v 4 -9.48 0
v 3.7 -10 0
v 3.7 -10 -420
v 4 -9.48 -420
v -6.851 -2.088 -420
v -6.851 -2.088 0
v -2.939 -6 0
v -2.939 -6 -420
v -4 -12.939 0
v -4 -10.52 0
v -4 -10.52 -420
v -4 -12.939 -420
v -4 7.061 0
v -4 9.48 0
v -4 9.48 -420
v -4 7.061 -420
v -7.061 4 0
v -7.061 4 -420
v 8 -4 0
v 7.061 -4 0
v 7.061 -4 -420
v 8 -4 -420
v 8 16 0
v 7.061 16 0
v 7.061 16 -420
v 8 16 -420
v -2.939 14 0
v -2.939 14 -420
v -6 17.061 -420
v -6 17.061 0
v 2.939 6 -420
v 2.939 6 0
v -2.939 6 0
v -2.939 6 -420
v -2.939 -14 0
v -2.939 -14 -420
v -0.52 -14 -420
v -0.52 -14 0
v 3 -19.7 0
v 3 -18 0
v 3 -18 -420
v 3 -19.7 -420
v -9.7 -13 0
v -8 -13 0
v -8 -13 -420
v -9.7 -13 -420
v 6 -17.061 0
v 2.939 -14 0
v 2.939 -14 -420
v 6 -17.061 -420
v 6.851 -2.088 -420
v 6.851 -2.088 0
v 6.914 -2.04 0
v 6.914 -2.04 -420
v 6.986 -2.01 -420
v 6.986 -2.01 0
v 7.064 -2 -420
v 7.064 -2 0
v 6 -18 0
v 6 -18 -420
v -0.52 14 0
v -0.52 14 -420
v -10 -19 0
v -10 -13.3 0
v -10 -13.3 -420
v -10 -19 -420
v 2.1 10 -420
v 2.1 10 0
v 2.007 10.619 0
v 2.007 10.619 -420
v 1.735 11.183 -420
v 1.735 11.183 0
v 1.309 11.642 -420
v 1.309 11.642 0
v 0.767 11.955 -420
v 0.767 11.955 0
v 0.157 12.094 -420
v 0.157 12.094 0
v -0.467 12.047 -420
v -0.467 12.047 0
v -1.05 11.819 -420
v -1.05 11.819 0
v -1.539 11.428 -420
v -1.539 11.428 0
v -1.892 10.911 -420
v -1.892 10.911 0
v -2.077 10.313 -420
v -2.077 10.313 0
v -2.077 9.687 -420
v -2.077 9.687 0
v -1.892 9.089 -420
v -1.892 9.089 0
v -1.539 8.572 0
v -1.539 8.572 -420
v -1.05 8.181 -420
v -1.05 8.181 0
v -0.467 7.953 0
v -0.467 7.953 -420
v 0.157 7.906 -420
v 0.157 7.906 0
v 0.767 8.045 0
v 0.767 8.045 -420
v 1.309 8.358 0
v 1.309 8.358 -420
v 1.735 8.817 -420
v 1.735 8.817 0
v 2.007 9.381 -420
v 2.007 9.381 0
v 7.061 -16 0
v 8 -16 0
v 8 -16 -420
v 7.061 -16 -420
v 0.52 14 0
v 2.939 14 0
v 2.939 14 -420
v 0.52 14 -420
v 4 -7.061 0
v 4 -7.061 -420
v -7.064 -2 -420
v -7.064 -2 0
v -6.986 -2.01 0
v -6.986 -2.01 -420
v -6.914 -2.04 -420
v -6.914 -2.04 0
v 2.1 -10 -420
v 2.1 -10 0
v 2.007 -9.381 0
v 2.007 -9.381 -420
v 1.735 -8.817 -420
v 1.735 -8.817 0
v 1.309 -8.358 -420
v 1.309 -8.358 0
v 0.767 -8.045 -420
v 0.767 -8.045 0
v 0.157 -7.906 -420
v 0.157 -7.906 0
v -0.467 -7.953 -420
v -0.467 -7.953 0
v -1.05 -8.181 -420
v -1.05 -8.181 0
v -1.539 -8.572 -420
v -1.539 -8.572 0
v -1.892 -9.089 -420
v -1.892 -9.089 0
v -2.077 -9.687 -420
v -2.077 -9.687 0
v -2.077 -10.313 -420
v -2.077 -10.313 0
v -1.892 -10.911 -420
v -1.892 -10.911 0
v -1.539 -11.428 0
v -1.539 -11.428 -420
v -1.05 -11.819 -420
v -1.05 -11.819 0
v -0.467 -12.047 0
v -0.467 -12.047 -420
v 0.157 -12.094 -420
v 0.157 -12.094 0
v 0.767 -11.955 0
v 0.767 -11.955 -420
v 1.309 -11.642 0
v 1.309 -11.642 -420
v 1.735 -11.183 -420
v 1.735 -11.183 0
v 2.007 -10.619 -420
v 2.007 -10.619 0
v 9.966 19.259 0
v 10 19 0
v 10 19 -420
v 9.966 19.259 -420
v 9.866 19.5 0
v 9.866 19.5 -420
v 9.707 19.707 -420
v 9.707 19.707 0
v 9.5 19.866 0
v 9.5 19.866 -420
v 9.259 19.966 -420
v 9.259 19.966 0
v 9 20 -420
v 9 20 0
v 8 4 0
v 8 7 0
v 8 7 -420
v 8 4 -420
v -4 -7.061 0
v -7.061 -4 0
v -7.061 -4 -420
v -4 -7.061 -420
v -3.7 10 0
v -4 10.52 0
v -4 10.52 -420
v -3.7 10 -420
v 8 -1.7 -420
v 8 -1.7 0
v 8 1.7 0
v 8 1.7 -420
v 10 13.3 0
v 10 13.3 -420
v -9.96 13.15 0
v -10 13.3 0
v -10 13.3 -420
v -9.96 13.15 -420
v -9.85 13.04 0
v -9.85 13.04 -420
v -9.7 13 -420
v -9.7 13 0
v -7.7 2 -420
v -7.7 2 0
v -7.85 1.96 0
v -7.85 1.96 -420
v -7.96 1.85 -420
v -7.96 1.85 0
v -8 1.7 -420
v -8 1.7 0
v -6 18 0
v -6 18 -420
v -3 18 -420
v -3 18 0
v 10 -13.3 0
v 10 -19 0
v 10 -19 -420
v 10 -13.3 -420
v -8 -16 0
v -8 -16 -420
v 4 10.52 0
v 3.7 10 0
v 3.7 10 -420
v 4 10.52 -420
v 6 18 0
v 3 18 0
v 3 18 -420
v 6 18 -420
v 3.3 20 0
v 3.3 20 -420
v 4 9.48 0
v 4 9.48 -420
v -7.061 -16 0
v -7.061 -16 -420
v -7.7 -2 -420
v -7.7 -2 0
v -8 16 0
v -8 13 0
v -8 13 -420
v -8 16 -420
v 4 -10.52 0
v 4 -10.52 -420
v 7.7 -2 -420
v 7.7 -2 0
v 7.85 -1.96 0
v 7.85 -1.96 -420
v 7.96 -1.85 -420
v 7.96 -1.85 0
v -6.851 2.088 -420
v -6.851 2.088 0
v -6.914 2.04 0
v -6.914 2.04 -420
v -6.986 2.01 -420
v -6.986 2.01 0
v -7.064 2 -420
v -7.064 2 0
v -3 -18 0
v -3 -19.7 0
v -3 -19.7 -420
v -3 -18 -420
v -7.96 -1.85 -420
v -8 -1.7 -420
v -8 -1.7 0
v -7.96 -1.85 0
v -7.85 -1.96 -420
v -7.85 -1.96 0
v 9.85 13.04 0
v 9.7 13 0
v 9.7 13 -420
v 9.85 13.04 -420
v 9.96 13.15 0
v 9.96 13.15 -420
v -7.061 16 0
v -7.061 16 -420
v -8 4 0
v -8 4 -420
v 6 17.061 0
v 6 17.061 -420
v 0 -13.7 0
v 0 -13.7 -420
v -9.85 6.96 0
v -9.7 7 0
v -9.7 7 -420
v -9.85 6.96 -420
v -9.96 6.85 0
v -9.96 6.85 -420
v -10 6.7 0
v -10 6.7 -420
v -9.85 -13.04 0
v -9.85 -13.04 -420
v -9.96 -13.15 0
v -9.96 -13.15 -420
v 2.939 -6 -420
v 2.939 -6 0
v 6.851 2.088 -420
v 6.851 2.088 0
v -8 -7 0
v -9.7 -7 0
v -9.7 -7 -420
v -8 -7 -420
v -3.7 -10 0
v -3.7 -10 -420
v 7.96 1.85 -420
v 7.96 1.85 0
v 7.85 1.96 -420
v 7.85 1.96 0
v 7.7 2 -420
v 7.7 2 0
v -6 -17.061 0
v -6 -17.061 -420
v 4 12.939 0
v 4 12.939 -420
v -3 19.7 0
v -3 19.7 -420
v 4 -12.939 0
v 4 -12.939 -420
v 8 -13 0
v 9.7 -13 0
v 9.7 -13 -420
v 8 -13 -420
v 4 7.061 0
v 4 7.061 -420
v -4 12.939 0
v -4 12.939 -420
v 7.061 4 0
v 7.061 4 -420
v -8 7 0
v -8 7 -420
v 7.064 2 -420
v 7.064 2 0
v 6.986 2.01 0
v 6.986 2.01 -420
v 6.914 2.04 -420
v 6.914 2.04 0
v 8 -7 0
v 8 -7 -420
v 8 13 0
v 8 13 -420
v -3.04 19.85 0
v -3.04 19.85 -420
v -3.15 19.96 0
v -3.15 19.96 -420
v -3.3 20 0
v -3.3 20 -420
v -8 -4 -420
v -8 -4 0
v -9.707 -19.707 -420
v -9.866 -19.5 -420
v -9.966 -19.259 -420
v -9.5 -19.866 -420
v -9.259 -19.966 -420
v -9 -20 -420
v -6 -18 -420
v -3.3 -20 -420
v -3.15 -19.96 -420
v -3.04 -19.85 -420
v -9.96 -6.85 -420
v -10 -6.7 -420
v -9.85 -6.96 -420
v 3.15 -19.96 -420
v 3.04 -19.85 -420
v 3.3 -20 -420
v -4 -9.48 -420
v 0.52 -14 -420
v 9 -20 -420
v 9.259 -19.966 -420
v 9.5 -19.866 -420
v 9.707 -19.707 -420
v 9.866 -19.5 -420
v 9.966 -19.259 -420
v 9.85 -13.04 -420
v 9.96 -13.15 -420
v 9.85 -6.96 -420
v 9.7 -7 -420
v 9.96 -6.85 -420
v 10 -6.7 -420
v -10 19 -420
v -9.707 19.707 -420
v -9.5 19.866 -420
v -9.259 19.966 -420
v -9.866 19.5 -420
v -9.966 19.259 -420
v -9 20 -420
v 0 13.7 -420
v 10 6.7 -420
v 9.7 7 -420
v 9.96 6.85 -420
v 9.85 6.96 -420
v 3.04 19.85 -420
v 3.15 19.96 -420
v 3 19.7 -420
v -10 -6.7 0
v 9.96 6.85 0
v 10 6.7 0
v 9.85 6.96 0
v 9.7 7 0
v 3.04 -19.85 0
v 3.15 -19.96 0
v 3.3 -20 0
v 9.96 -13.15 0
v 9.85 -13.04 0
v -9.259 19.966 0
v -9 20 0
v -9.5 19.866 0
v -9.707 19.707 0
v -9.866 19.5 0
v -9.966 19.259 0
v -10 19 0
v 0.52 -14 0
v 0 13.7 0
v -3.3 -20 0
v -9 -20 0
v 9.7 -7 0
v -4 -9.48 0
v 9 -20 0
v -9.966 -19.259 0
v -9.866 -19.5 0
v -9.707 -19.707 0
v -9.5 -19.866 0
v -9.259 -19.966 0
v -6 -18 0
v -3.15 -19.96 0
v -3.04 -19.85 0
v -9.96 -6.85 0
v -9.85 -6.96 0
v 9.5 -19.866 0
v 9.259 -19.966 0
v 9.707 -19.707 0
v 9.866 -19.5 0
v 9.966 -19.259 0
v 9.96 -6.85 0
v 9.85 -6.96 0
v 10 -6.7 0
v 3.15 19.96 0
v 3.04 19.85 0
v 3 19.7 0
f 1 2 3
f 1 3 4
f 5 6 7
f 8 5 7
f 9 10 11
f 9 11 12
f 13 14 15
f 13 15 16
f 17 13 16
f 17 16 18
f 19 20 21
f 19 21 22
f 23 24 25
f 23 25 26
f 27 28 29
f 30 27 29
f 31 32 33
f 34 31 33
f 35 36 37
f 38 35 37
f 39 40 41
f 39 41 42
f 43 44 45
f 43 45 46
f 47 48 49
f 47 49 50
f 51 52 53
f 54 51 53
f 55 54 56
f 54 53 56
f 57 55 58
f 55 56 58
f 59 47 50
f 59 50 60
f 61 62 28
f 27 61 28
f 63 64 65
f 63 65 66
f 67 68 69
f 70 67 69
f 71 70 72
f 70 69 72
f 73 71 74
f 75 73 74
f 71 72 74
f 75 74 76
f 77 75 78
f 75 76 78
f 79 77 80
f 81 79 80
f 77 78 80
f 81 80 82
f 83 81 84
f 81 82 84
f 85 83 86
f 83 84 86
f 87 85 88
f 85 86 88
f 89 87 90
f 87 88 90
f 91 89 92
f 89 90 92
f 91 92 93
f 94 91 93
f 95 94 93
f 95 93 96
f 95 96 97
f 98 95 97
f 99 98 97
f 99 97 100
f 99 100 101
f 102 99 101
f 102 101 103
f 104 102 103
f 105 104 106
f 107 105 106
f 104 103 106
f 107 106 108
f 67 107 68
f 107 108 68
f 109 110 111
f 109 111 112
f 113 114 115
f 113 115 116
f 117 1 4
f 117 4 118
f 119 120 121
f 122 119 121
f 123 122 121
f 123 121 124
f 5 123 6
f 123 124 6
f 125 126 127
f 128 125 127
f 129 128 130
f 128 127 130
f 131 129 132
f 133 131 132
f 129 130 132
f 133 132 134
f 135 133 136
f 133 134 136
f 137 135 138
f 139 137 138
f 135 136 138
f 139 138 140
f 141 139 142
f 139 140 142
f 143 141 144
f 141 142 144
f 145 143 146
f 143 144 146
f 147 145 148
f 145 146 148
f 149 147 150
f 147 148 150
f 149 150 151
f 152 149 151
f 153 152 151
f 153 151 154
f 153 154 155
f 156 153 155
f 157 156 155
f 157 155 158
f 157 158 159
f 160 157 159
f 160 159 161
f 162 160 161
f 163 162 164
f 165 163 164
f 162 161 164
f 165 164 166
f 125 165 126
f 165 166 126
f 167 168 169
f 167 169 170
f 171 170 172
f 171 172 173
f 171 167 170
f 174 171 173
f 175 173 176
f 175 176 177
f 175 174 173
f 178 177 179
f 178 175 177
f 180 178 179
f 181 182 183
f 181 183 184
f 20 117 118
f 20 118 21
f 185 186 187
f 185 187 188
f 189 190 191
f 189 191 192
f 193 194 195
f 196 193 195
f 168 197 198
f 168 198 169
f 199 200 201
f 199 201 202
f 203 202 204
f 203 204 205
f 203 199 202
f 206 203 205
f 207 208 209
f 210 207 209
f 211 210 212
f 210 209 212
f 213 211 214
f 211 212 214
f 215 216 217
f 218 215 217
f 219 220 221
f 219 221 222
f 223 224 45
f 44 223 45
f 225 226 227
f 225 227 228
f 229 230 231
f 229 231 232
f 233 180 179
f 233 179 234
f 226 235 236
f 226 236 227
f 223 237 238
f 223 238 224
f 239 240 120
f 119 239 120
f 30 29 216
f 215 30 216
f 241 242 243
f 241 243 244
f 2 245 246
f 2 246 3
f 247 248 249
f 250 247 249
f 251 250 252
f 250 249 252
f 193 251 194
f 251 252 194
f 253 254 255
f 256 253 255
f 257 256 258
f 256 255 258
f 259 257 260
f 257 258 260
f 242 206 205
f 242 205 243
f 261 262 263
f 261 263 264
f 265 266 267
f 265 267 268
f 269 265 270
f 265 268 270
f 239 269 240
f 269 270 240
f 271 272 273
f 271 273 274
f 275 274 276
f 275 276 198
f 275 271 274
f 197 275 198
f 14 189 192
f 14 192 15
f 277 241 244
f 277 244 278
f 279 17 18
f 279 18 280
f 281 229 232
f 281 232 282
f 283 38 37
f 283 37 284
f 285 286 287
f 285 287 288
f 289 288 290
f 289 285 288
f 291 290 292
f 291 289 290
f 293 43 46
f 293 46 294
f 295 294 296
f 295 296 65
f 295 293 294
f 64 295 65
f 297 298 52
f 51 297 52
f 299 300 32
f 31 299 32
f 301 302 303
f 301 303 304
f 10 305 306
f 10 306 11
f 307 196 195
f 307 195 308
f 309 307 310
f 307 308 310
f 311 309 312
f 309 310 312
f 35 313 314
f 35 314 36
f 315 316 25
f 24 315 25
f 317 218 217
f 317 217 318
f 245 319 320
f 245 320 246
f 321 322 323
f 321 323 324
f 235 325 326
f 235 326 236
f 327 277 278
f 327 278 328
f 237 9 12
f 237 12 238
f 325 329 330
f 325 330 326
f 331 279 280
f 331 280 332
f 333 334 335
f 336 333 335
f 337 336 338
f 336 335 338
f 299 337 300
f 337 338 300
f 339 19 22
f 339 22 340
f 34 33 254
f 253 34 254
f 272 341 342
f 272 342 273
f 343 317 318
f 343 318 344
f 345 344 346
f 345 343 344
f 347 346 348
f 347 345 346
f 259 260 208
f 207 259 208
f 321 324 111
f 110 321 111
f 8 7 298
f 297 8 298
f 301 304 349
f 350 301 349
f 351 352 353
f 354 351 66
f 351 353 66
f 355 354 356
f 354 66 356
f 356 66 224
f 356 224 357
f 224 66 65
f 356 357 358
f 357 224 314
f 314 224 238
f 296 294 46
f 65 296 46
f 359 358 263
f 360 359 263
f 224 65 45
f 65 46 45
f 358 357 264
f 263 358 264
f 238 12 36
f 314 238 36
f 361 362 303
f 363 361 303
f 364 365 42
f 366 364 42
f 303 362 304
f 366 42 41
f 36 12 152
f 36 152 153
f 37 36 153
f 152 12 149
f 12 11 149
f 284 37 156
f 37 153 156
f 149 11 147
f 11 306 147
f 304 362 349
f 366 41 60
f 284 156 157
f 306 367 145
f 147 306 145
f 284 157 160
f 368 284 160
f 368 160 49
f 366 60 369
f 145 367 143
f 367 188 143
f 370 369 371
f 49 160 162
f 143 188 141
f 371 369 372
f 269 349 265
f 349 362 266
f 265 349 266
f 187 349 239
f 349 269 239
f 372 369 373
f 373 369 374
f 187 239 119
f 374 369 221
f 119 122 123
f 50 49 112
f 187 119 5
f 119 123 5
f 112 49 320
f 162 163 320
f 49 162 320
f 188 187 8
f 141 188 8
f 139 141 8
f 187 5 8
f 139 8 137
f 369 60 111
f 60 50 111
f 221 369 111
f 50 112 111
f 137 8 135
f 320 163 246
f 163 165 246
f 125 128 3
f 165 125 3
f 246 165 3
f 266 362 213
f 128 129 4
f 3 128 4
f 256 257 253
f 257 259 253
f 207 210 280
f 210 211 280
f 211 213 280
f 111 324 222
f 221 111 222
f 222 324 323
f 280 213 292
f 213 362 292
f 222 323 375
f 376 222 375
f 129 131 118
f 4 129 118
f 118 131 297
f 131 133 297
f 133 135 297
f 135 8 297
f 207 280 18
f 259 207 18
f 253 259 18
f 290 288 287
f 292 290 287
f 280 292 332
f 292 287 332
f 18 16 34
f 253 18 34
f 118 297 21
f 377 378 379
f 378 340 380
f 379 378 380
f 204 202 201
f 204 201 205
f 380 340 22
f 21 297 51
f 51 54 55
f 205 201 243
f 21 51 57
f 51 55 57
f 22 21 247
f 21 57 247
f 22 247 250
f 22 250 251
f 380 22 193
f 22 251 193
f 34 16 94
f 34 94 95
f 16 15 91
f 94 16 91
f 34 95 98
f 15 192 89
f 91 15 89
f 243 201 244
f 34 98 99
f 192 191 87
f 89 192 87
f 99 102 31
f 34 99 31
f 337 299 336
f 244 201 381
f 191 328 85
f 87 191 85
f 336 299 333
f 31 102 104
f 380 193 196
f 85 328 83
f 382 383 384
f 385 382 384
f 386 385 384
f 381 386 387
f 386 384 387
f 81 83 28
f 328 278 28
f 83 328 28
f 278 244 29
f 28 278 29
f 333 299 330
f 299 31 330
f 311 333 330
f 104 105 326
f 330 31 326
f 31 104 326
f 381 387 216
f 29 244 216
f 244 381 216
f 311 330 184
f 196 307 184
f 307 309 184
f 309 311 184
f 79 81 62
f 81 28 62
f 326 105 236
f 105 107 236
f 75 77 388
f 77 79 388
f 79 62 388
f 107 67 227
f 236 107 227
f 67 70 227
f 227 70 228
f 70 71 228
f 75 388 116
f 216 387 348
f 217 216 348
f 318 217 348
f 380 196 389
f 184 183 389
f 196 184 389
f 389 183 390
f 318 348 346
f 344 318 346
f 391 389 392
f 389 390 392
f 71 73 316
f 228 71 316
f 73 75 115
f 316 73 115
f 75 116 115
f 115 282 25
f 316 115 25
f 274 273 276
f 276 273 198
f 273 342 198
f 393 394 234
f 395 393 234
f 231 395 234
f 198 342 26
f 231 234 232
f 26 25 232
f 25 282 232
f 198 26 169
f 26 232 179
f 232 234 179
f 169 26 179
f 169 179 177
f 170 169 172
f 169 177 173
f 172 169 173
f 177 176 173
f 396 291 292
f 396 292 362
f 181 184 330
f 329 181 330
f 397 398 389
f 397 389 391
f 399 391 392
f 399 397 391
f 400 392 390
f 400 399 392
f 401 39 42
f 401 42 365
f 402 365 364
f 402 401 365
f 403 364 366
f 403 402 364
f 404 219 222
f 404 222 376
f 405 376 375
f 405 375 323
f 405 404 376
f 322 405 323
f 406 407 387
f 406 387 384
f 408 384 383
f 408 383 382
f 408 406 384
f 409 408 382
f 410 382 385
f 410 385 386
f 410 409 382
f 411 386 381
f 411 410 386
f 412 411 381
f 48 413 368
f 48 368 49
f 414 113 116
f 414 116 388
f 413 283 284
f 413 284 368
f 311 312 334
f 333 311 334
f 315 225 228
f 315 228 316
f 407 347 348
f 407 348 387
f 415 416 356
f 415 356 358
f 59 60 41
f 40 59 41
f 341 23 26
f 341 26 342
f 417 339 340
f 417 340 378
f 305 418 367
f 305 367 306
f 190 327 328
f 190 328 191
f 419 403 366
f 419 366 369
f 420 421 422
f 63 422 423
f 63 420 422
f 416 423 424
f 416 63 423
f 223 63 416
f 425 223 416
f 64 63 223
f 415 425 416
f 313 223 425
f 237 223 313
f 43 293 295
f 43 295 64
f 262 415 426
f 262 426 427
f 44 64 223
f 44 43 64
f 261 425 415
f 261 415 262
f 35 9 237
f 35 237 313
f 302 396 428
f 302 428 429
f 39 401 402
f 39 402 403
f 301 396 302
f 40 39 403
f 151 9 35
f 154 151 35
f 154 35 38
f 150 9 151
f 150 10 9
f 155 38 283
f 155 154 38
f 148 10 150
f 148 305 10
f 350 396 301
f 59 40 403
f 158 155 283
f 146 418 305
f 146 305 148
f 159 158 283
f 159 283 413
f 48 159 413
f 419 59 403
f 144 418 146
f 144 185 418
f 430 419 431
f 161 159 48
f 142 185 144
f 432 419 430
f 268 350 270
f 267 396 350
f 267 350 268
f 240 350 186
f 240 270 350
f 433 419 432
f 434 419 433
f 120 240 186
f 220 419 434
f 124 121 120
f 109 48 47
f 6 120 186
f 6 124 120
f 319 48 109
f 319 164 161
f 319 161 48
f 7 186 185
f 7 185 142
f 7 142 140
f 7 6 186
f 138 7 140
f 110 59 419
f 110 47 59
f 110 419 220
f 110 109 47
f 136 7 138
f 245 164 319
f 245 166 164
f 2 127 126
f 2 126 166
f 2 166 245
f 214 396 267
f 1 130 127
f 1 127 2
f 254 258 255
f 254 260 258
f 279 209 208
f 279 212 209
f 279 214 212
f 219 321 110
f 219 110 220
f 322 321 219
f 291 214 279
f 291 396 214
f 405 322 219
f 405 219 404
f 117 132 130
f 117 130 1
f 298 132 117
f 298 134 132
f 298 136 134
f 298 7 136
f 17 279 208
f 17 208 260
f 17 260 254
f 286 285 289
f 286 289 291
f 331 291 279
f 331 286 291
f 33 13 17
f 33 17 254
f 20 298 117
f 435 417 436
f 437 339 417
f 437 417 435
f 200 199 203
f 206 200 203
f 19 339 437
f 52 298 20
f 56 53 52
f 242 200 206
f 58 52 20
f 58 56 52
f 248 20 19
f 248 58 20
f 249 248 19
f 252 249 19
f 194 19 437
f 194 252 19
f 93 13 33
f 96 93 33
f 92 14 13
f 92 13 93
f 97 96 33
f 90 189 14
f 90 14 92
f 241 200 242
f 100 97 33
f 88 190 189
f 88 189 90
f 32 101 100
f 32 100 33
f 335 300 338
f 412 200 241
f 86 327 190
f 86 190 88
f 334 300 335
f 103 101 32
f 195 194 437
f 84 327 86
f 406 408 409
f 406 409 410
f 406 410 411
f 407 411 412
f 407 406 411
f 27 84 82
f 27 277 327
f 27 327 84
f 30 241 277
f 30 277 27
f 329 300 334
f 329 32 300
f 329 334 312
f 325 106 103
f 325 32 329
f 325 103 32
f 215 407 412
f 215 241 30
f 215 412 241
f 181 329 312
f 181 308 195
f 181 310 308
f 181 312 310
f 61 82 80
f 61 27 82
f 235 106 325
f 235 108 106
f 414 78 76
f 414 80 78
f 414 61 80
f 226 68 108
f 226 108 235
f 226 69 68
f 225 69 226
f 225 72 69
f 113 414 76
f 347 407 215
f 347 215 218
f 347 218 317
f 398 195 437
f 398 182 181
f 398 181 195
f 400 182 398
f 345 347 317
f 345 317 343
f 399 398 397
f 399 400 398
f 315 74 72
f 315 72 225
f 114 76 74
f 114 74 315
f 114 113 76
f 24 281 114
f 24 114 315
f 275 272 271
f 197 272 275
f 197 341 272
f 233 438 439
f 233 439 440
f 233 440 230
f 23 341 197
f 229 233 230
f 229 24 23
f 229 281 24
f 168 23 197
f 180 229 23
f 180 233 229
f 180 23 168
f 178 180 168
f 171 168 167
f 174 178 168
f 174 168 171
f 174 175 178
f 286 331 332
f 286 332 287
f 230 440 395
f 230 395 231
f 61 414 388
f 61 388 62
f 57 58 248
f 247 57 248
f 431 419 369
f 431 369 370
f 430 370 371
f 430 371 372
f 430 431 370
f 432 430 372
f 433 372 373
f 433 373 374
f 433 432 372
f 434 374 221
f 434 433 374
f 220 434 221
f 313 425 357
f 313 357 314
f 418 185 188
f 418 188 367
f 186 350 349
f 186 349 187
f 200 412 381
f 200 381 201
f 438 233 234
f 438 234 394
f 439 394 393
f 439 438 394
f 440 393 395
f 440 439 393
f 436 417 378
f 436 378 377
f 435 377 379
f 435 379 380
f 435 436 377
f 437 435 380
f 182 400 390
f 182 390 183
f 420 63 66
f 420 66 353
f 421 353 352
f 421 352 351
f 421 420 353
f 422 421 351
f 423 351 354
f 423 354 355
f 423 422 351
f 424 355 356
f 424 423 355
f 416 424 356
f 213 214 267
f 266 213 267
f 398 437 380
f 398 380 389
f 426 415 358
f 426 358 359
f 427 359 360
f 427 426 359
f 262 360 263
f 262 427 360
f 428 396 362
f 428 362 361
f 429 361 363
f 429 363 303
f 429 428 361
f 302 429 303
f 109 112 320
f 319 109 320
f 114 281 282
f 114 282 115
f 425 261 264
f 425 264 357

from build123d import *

# Parameters (mm, degrees)
SKETCH1_R           = 2.0999999
BOSS_EXTRUDE1_DEPTH = 420


with BuildPart() as part:
    # Sketch1 → Boss-Extrude1 (new body)
    with BuildSketch(Plane.XY):
        with BuildLine():
            Line((-10, -13.3000005), (-10, -19))
            ThreePointArc((-10, -19), (-9.707106781, -19.707106781), (-9, -20))
            Line((-9, -20), (-3.3, -20))
            ThreePointArc((-3.3, -20), (-3.087867966, -19.912132034), (-3, -19.7))
            Line((-3, -19.7), (-3, -18))
            Line((-3, -18), (-6, -18))
            Line((-6, -18), (-6, -17.0606825))
            Line((-6, -17.0606825), (-2.939318, -14))
            Line((-2.939318, -14), (-0.519615242, -14))
            Line((-0.519615242, -14), (0, -13.7))
            Line((0, -13.7), (0.519615242, -14))
            Line((0.519615242, -14), (2.9393365, -14))
            Line((2.9393365, -14), (6, -17.0606628))
            Line((6, -17.0606628), (6, -18))
            Line((6, -18), (3, -18))
            Line((3, -18), (3, -19.7))
            ThreePointArc((3, -19.7), (3.087867966, -19.912132034), (3.3, -20))
            Line((3.3, -20), (9, -20))
            ThreePointArc((9, -20), (9.707106781, -19.707106781), (10, -19))
            Line((10, -19), (10, -13.3000005))
            ThreePointArc((10, -13.3000005), (9.912132034, -13.087868466), (9.7, -13.0000005))
            Line((9.7, -13.0000005), (8, -13.0000005))
            Line((8, -13.0000005), (8, -16.0000005))
            Line((8, -16.0000005), (7.06065685, -16.0000005))
            Line((7.06065685, -16.0000005), (4, -12.93934215))
            Line((4, -12.93934215), (4, -10.519615742))
            Line((4, -10.519615742), (3.7, -10.0000005))
            Line((3.7, -10.0000005), (4, -9.480385258))
            Line((4, -9.480385258), (4, -7.06068365))
            Line((4, -7.06068365), (7.06068236, -4.000000504))
            Line((7.06068236, -4.000000504), (8, -4.000000504))
            Line((8, -4.000000504), (8, -7.0000005))
            Line((8, -7.0000005), (9.7, -7.0000005))
            ThreePointArc((9.7, -7.0000005), (9.912132034, -6.912132534), (10, -6.7000005))
            Line((10, -6.7000005), (10, 6.7))
            ThreePointArc((10, 6.7), (9.912132034, 6.912132034), (9.7, 7))
            Line((9.7, 7), (8, 7))
            Line((8, 7), (8, 4))
            Line((8, 4), (7.060678, 4))
            Line((7.060678, 4), (4, 7.06068075))
            Line((4, 7.06068075), (4, 9.480384758))
            Line((4, 9.480384758), (3.7, 10))
            Line((3.7, 10), (4, 10.519615242))
            Line((4, 10.519615242), (4, 12.93933675))
            Line((4, 12.93933675), (7.060661, 16))
            Line((7.060661, 16), (8, 16))
            Line((8, 16), (8, 13))
            Line((8, 13), (9.7, 13))
            ThreePointArc((9.7, 13), (9.912132034, 13.087867966), (10, 13.3))
            Line((10, 13.3), (10, 19))
            ThreePointArc((10, 19), (9.707106781, 19.707106781), (9, 20))
            Line((9, 20), (3.3, 20))
            ThreePointArc((3.3, 20), (3.087867966, 19.912132034), (3, 19.7))
            Line((3, 19.7), (3, 18))
            Line((3, 18), (6, 18))
            Line((6, 18), (6, 17.06065975))
            Line((6, 17.06065975), (2.939354, 14))
            Line((2.939354, 14), (0.519638625, 14))
            Line((0.519638625, 14), (0, 13.6999865))
            Line((0, 13.6999865), (-0.519638625, 14))
            Line((-0.519638625, 14), (-2.939335, 14))
            Line((-2.939335, 14), (-6, 17.060678))
            Line((-6, 17.060678), (-6, 18))
            Line((-6, 18), (-3, 18))
            Line((-3, 18), (-3, 19.7))
            ThreePointArc((-3, 19.7), (-3.087867966, 19.912132034), (-3.3, 20))
            Line((-3.3, 20), (-9, 20))
            ThreePointArc((-9, 20), (-9.707106781, 19.707106781), (-10, 19))
            Line((-10, 19), (-10, 13.3))
            ThreePointArc((-10, 13.3), (-9.912132034, 13.087867966), (-9.7, 13))
            Line((-9.7, 13), (-8, 13))
            Line((-8, 13), (-8, 16))
            Line((-8, 16), (-7.060642, 16))
            Line((-7.060642, 16), (-4, 12.9393565))
            Line((-4, 12.9393565), (-4, 10.519615242))
            Line((-4, 10.519615242), (-3.7, 10))
            Line((-3.7, 10), (-4, 9.480384758))
            Line((-4, 9.480384758), (-4, 7.06066))
            Line((-4, 7.06066), (-7.060659, 4))
            Line((-7.060659, 4), (-8, 4))
            Line((-8, 4), (-8, 7))
            Line((-8, 7), (-9.7, 7))
            ThreePointArc((-9.7, 7), (-9.912132034, 6.912132034), (-10, 6.7))
            Line((-10, 6.7), (-10, -6.7000005))
            ThreePointArc((-10, -6.7000005), (-9.912132034, -6.912132534), (-9.7, -7.0000005))
            Line((-9.7, -7.0000005), (-8, -7.0000005))
            Line((-8, -7.0000005), (-8, -4.0000005))
            Line((-8, -4.0000005), (-7.06066257, -4.0000005))
            Line((-7.06066257, -4.0000005), (-4, -7.0606688))
            Line((-4, -7.0606688), (-4, -9.480385258))
            Line((-4, -9.480385258), (-3.7, -10.0000005))
            Line((-3.7, -10.0000005), (-4, -10.519615742))
            Line((-4, -10.519615742), (-4, -12.9393575))
            Line((-4, -12.9393575), (-7.0606365, -16.0000005))
            Line((-7.0606365, -16.0000005), (-8, -16.0000005))
            Line((-8, -16.0000005), (-8, -13.0000005))
            Line((-8, -13.0000005), (-9.7, -13.0000005))
            ThreePointArc((-9.7, -13.0000005), (-9.912132034, -13.087868466), (-10, -13.3000005))
        make_face()
        with Locations((0, 10)):
            Circle(SKETCH1_R, mode=Mode.SUBTRACT)
        with Locations((0, -10.0000005)):
            Circle(SKETCH1_R, mode=Mode.SUBTRACT)
        with BuildLine():
            Line((-8, 1.6999995), (-8, -1.70000025))
            ThreePointArc((-8, -1.70000025), (-7.912132034, -1.912132284), (-7.7, -2.00000025))
            Line((-7.7, -2.00000025), (-7.063604538, -2.00000025))
            ThreePointArc((-7.063604538, -2.00000025), (-6.948800316, -2.022823986), (-6.851481305, -2.087861995))
            Line((-6.851481305, -2.087861995), (-2.939335, -6))
            Line((-2.939335, -6), (2.93933195, -6))
            Line((2.93933195, -6), (6.851479294, -2.087861656))
            ThreePointArc((6.851479294, -2.087861656), (6.948799922, -2.022824212), (7.06360515, -2.00000025))
            Line((7.06360515, -2.00000025), (7.7, -2.00000025))
            ThreePointArc((7.7, -2.00000025), (7.912132034, -1.912132284), (8, -1.70000025))
            Line((8, -1.70000025), (8, 1.6999995))
            ThreePointArc((8, 1.6999995), (7.912132034, 1.912131534), (7.7, 1.9999995))
            Line((7.7, 1.9999995), (7.06359945, 1.9999995))
            ThreePointArc((7.06359945, 1.9999995), (6.9487942, 2.022823721), (6.851474147, 2.087862153))
            Line((6.851474147, 2.087862153), (2.9393355, 6))
            Line((2.9393355, 6), (-2.939339, 6))
            Line((-2.939339, 6), (-6.851476944, 2.087862556))
            ThreePointArc((-6.851476944, 2.087862556), (-6.948795311, 2.022823488), (-7.063599538, 1.9999995))
            Line((-7.063599538, 1.9999995), (-7.7, 1.9999995))
            ThreePointArc((-7.7, 1.9999995), (-7.912132034, 1.912131534), (-8, 1.6999995))
        make_face(mode=Mode.SUBTRACT)
    extrude(amount=-BOSS_EXTRUDE1_DEPTH)


solid = part.part
